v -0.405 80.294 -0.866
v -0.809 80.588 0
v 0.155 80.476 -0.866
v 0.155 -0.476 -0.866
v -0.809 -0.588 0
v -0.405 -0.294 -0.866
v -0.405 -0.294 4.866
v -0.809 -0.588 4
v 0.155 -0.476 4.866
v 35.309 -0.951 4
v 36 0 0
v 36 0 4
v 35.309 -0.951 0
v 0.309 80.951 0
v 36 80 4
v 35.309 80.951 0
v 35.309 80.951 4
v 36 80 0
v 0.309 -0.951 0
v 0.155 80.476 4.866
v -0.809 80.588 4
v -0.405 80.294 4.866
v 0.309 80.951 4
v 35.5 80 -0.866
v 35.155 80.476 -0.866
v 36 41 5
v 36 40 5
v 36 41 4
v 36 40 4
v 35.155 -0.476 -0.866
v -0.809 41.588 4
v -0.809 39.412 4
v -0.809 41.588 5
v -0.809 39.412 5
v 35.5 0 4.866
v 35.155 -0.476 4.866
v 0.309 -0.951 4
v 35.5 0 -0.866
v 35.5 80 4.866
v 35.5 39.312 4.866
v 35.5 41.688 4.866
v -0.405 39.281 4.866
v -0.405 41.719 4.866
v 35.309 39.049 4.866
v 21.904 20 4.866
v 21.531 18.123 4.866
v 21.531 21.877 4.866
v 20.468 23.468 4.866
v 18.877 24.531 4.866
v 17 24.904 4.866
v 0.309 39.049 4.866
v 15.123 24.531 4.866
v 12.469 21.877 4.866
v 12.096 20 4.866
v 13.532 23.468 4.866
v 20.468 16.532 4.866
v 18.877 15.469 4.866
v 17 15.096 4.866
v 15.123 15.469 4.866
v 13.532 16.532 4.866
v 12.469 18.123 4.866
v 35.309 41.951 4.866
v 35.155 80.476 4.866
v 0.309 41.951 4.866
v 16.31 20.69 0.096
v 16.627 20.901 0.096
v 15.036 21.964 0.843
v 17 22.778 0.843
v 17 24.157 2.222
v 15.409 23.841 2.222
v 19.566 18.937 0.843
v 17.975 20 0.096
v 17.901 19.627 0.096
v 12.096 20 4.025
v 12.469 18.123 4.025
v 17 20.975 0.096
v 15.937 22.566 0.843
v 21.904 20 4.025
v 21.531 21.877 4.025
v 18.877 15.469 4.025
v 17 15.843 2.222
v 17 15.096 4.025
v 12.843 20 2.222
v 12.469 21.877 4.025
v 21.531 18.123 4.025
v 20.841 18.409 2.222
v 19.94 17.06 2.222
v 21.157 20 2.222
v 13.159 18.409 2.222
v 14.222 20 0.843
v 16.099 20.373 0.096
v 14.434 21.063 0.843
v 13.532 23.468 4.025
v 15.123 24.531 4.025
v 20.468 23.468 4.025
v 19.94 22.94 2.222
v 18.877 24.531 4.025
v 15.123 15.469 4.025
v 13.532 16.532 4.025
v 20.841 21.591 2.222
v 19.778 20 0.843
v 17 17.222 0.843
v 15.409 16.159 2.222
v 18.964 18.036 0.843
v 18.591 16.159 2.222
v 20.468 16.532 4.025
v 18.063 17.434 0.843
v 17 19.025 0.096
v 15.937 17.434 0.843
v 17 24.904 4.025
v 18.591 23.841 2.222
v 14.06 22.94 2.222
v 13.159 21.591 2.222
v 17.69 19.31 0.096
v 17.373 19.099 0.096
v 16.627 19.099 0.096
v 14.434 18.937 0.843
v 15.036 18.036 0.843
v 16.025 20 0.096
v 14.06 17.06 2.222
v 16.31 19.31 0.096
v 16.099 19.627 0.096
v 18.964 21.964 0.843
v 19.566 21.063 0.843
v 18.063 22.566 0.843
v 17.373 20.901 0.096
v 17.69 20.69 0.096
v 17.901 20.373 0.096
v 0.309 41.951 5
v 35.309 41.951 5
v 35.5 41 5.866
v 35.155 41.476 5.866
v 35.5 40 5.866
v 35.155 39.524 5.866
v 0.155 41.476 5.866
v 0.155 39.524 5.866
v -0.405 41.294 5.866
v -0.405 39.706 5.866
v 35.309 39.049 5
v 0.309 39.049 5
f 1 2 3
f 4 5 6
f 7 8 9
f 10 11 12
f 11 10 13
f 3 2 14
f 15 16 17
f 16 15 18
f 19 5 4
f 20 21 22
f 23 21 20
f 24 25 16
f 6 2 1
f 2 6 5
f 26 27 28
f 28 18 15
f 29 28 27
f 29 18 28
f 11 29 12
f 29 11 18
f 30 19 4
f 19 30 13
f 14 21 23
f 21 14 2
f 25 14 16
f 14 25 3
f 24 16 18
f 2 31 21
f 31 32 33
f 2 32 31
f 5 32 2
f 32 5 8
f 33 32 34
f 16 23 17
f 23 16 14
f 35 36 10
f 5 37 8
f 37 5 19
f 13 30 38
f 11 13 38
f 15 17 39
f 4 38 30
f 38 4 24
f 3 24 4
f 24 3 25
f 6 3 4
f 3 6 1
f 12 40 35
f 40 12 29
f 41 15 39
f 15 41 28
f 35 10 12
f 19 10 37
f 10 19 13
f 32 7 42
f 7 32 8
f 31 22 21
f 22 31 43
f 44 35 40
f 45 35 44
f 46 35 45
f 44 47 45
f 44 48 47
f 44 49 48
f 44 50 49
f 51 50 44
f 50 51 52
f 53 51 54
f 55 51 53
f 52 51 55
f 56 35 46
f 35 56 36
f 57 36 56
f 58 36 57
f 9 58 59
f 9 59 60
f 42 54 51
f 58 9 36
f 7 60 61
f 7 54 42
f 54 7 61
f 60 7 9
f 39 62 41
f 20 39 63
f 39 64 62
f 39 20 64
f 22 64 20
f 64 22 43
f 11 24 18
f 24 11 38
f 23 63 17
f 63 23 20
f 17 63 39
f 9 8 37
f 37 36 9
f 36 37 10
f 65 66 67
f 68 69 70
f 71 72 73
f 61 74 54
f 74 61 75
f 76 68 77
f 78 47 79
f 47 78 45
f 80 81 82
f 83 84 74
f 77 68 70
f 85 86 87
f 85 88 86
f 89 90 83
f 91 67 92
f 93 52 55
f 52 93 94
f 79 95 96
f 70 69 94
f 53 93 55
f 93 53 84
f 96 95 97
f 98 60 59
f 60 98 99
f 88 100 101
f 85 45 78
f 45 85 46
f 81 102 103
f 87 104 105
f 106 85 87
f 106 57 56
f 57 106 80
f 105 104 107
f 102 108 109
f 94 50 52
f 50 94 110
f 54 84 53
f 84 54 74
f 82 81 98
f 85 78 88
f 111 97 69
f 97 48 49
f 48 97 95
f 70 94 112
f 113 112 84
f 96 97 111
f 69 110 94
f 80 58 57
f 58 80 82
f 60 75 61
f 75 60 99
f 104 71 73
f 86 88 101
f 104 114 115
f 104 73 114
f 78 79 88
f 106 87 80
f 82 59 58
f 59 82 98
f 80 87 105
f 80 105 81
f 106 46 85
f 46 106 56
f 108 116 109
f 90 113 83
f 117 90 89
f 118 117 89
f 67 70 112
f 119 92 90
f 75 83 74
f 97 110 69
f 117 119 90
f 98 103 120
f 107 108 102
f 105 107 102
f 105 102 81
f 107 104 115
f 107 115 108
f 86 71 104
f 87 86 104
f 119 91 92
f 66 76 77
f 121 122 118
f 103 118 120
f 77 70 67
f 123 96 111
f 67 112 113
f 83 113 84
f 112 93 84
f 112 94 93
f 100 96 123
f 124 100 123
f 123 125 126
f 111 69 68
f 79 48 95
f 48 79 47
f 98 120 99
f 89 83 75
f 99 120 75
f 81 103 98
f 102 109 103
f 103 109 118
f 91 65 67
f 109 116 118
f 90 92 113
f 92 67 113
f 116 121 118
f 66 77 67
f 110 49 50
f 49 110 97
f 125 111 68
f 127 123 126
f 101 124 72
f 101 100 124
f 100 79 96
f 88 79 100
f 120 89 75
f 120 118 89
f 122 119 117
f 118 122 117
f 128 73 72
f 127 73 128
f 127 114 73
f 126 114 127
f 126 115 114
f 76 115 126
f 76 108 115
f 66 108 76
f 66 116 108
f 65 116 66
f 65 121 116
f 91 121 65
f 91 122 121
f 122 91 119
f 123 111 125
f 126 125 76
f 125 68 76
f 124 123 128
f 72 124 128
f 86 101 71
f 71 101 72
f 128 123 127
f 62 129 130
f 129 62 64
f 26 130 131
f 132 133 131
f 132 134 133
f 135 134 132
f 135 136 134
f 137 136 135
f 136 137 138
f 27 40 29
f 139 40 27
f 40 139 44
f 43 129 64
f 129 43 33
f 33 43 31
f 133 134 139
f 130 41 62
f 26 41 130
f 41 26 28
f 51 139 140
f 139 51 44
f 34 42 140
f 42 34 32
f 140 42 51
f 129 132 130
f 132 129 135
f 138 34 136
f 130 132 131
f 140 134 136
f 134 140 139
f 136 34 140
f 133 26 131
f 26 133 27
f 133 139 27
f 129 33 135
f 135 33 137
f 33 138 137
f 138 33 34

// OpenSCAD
// Loguncov Maxim 13.12.13


//$fn=128;


translate([0,40,0])
minkowski()
{cube([35,1,5]);
sphere(1);
}

difference() {

//основа
minkowski()
{cube([35,80,4]);
sphere(1);
}
//отверстия
translate([17,20,5])sphere(5);






}
